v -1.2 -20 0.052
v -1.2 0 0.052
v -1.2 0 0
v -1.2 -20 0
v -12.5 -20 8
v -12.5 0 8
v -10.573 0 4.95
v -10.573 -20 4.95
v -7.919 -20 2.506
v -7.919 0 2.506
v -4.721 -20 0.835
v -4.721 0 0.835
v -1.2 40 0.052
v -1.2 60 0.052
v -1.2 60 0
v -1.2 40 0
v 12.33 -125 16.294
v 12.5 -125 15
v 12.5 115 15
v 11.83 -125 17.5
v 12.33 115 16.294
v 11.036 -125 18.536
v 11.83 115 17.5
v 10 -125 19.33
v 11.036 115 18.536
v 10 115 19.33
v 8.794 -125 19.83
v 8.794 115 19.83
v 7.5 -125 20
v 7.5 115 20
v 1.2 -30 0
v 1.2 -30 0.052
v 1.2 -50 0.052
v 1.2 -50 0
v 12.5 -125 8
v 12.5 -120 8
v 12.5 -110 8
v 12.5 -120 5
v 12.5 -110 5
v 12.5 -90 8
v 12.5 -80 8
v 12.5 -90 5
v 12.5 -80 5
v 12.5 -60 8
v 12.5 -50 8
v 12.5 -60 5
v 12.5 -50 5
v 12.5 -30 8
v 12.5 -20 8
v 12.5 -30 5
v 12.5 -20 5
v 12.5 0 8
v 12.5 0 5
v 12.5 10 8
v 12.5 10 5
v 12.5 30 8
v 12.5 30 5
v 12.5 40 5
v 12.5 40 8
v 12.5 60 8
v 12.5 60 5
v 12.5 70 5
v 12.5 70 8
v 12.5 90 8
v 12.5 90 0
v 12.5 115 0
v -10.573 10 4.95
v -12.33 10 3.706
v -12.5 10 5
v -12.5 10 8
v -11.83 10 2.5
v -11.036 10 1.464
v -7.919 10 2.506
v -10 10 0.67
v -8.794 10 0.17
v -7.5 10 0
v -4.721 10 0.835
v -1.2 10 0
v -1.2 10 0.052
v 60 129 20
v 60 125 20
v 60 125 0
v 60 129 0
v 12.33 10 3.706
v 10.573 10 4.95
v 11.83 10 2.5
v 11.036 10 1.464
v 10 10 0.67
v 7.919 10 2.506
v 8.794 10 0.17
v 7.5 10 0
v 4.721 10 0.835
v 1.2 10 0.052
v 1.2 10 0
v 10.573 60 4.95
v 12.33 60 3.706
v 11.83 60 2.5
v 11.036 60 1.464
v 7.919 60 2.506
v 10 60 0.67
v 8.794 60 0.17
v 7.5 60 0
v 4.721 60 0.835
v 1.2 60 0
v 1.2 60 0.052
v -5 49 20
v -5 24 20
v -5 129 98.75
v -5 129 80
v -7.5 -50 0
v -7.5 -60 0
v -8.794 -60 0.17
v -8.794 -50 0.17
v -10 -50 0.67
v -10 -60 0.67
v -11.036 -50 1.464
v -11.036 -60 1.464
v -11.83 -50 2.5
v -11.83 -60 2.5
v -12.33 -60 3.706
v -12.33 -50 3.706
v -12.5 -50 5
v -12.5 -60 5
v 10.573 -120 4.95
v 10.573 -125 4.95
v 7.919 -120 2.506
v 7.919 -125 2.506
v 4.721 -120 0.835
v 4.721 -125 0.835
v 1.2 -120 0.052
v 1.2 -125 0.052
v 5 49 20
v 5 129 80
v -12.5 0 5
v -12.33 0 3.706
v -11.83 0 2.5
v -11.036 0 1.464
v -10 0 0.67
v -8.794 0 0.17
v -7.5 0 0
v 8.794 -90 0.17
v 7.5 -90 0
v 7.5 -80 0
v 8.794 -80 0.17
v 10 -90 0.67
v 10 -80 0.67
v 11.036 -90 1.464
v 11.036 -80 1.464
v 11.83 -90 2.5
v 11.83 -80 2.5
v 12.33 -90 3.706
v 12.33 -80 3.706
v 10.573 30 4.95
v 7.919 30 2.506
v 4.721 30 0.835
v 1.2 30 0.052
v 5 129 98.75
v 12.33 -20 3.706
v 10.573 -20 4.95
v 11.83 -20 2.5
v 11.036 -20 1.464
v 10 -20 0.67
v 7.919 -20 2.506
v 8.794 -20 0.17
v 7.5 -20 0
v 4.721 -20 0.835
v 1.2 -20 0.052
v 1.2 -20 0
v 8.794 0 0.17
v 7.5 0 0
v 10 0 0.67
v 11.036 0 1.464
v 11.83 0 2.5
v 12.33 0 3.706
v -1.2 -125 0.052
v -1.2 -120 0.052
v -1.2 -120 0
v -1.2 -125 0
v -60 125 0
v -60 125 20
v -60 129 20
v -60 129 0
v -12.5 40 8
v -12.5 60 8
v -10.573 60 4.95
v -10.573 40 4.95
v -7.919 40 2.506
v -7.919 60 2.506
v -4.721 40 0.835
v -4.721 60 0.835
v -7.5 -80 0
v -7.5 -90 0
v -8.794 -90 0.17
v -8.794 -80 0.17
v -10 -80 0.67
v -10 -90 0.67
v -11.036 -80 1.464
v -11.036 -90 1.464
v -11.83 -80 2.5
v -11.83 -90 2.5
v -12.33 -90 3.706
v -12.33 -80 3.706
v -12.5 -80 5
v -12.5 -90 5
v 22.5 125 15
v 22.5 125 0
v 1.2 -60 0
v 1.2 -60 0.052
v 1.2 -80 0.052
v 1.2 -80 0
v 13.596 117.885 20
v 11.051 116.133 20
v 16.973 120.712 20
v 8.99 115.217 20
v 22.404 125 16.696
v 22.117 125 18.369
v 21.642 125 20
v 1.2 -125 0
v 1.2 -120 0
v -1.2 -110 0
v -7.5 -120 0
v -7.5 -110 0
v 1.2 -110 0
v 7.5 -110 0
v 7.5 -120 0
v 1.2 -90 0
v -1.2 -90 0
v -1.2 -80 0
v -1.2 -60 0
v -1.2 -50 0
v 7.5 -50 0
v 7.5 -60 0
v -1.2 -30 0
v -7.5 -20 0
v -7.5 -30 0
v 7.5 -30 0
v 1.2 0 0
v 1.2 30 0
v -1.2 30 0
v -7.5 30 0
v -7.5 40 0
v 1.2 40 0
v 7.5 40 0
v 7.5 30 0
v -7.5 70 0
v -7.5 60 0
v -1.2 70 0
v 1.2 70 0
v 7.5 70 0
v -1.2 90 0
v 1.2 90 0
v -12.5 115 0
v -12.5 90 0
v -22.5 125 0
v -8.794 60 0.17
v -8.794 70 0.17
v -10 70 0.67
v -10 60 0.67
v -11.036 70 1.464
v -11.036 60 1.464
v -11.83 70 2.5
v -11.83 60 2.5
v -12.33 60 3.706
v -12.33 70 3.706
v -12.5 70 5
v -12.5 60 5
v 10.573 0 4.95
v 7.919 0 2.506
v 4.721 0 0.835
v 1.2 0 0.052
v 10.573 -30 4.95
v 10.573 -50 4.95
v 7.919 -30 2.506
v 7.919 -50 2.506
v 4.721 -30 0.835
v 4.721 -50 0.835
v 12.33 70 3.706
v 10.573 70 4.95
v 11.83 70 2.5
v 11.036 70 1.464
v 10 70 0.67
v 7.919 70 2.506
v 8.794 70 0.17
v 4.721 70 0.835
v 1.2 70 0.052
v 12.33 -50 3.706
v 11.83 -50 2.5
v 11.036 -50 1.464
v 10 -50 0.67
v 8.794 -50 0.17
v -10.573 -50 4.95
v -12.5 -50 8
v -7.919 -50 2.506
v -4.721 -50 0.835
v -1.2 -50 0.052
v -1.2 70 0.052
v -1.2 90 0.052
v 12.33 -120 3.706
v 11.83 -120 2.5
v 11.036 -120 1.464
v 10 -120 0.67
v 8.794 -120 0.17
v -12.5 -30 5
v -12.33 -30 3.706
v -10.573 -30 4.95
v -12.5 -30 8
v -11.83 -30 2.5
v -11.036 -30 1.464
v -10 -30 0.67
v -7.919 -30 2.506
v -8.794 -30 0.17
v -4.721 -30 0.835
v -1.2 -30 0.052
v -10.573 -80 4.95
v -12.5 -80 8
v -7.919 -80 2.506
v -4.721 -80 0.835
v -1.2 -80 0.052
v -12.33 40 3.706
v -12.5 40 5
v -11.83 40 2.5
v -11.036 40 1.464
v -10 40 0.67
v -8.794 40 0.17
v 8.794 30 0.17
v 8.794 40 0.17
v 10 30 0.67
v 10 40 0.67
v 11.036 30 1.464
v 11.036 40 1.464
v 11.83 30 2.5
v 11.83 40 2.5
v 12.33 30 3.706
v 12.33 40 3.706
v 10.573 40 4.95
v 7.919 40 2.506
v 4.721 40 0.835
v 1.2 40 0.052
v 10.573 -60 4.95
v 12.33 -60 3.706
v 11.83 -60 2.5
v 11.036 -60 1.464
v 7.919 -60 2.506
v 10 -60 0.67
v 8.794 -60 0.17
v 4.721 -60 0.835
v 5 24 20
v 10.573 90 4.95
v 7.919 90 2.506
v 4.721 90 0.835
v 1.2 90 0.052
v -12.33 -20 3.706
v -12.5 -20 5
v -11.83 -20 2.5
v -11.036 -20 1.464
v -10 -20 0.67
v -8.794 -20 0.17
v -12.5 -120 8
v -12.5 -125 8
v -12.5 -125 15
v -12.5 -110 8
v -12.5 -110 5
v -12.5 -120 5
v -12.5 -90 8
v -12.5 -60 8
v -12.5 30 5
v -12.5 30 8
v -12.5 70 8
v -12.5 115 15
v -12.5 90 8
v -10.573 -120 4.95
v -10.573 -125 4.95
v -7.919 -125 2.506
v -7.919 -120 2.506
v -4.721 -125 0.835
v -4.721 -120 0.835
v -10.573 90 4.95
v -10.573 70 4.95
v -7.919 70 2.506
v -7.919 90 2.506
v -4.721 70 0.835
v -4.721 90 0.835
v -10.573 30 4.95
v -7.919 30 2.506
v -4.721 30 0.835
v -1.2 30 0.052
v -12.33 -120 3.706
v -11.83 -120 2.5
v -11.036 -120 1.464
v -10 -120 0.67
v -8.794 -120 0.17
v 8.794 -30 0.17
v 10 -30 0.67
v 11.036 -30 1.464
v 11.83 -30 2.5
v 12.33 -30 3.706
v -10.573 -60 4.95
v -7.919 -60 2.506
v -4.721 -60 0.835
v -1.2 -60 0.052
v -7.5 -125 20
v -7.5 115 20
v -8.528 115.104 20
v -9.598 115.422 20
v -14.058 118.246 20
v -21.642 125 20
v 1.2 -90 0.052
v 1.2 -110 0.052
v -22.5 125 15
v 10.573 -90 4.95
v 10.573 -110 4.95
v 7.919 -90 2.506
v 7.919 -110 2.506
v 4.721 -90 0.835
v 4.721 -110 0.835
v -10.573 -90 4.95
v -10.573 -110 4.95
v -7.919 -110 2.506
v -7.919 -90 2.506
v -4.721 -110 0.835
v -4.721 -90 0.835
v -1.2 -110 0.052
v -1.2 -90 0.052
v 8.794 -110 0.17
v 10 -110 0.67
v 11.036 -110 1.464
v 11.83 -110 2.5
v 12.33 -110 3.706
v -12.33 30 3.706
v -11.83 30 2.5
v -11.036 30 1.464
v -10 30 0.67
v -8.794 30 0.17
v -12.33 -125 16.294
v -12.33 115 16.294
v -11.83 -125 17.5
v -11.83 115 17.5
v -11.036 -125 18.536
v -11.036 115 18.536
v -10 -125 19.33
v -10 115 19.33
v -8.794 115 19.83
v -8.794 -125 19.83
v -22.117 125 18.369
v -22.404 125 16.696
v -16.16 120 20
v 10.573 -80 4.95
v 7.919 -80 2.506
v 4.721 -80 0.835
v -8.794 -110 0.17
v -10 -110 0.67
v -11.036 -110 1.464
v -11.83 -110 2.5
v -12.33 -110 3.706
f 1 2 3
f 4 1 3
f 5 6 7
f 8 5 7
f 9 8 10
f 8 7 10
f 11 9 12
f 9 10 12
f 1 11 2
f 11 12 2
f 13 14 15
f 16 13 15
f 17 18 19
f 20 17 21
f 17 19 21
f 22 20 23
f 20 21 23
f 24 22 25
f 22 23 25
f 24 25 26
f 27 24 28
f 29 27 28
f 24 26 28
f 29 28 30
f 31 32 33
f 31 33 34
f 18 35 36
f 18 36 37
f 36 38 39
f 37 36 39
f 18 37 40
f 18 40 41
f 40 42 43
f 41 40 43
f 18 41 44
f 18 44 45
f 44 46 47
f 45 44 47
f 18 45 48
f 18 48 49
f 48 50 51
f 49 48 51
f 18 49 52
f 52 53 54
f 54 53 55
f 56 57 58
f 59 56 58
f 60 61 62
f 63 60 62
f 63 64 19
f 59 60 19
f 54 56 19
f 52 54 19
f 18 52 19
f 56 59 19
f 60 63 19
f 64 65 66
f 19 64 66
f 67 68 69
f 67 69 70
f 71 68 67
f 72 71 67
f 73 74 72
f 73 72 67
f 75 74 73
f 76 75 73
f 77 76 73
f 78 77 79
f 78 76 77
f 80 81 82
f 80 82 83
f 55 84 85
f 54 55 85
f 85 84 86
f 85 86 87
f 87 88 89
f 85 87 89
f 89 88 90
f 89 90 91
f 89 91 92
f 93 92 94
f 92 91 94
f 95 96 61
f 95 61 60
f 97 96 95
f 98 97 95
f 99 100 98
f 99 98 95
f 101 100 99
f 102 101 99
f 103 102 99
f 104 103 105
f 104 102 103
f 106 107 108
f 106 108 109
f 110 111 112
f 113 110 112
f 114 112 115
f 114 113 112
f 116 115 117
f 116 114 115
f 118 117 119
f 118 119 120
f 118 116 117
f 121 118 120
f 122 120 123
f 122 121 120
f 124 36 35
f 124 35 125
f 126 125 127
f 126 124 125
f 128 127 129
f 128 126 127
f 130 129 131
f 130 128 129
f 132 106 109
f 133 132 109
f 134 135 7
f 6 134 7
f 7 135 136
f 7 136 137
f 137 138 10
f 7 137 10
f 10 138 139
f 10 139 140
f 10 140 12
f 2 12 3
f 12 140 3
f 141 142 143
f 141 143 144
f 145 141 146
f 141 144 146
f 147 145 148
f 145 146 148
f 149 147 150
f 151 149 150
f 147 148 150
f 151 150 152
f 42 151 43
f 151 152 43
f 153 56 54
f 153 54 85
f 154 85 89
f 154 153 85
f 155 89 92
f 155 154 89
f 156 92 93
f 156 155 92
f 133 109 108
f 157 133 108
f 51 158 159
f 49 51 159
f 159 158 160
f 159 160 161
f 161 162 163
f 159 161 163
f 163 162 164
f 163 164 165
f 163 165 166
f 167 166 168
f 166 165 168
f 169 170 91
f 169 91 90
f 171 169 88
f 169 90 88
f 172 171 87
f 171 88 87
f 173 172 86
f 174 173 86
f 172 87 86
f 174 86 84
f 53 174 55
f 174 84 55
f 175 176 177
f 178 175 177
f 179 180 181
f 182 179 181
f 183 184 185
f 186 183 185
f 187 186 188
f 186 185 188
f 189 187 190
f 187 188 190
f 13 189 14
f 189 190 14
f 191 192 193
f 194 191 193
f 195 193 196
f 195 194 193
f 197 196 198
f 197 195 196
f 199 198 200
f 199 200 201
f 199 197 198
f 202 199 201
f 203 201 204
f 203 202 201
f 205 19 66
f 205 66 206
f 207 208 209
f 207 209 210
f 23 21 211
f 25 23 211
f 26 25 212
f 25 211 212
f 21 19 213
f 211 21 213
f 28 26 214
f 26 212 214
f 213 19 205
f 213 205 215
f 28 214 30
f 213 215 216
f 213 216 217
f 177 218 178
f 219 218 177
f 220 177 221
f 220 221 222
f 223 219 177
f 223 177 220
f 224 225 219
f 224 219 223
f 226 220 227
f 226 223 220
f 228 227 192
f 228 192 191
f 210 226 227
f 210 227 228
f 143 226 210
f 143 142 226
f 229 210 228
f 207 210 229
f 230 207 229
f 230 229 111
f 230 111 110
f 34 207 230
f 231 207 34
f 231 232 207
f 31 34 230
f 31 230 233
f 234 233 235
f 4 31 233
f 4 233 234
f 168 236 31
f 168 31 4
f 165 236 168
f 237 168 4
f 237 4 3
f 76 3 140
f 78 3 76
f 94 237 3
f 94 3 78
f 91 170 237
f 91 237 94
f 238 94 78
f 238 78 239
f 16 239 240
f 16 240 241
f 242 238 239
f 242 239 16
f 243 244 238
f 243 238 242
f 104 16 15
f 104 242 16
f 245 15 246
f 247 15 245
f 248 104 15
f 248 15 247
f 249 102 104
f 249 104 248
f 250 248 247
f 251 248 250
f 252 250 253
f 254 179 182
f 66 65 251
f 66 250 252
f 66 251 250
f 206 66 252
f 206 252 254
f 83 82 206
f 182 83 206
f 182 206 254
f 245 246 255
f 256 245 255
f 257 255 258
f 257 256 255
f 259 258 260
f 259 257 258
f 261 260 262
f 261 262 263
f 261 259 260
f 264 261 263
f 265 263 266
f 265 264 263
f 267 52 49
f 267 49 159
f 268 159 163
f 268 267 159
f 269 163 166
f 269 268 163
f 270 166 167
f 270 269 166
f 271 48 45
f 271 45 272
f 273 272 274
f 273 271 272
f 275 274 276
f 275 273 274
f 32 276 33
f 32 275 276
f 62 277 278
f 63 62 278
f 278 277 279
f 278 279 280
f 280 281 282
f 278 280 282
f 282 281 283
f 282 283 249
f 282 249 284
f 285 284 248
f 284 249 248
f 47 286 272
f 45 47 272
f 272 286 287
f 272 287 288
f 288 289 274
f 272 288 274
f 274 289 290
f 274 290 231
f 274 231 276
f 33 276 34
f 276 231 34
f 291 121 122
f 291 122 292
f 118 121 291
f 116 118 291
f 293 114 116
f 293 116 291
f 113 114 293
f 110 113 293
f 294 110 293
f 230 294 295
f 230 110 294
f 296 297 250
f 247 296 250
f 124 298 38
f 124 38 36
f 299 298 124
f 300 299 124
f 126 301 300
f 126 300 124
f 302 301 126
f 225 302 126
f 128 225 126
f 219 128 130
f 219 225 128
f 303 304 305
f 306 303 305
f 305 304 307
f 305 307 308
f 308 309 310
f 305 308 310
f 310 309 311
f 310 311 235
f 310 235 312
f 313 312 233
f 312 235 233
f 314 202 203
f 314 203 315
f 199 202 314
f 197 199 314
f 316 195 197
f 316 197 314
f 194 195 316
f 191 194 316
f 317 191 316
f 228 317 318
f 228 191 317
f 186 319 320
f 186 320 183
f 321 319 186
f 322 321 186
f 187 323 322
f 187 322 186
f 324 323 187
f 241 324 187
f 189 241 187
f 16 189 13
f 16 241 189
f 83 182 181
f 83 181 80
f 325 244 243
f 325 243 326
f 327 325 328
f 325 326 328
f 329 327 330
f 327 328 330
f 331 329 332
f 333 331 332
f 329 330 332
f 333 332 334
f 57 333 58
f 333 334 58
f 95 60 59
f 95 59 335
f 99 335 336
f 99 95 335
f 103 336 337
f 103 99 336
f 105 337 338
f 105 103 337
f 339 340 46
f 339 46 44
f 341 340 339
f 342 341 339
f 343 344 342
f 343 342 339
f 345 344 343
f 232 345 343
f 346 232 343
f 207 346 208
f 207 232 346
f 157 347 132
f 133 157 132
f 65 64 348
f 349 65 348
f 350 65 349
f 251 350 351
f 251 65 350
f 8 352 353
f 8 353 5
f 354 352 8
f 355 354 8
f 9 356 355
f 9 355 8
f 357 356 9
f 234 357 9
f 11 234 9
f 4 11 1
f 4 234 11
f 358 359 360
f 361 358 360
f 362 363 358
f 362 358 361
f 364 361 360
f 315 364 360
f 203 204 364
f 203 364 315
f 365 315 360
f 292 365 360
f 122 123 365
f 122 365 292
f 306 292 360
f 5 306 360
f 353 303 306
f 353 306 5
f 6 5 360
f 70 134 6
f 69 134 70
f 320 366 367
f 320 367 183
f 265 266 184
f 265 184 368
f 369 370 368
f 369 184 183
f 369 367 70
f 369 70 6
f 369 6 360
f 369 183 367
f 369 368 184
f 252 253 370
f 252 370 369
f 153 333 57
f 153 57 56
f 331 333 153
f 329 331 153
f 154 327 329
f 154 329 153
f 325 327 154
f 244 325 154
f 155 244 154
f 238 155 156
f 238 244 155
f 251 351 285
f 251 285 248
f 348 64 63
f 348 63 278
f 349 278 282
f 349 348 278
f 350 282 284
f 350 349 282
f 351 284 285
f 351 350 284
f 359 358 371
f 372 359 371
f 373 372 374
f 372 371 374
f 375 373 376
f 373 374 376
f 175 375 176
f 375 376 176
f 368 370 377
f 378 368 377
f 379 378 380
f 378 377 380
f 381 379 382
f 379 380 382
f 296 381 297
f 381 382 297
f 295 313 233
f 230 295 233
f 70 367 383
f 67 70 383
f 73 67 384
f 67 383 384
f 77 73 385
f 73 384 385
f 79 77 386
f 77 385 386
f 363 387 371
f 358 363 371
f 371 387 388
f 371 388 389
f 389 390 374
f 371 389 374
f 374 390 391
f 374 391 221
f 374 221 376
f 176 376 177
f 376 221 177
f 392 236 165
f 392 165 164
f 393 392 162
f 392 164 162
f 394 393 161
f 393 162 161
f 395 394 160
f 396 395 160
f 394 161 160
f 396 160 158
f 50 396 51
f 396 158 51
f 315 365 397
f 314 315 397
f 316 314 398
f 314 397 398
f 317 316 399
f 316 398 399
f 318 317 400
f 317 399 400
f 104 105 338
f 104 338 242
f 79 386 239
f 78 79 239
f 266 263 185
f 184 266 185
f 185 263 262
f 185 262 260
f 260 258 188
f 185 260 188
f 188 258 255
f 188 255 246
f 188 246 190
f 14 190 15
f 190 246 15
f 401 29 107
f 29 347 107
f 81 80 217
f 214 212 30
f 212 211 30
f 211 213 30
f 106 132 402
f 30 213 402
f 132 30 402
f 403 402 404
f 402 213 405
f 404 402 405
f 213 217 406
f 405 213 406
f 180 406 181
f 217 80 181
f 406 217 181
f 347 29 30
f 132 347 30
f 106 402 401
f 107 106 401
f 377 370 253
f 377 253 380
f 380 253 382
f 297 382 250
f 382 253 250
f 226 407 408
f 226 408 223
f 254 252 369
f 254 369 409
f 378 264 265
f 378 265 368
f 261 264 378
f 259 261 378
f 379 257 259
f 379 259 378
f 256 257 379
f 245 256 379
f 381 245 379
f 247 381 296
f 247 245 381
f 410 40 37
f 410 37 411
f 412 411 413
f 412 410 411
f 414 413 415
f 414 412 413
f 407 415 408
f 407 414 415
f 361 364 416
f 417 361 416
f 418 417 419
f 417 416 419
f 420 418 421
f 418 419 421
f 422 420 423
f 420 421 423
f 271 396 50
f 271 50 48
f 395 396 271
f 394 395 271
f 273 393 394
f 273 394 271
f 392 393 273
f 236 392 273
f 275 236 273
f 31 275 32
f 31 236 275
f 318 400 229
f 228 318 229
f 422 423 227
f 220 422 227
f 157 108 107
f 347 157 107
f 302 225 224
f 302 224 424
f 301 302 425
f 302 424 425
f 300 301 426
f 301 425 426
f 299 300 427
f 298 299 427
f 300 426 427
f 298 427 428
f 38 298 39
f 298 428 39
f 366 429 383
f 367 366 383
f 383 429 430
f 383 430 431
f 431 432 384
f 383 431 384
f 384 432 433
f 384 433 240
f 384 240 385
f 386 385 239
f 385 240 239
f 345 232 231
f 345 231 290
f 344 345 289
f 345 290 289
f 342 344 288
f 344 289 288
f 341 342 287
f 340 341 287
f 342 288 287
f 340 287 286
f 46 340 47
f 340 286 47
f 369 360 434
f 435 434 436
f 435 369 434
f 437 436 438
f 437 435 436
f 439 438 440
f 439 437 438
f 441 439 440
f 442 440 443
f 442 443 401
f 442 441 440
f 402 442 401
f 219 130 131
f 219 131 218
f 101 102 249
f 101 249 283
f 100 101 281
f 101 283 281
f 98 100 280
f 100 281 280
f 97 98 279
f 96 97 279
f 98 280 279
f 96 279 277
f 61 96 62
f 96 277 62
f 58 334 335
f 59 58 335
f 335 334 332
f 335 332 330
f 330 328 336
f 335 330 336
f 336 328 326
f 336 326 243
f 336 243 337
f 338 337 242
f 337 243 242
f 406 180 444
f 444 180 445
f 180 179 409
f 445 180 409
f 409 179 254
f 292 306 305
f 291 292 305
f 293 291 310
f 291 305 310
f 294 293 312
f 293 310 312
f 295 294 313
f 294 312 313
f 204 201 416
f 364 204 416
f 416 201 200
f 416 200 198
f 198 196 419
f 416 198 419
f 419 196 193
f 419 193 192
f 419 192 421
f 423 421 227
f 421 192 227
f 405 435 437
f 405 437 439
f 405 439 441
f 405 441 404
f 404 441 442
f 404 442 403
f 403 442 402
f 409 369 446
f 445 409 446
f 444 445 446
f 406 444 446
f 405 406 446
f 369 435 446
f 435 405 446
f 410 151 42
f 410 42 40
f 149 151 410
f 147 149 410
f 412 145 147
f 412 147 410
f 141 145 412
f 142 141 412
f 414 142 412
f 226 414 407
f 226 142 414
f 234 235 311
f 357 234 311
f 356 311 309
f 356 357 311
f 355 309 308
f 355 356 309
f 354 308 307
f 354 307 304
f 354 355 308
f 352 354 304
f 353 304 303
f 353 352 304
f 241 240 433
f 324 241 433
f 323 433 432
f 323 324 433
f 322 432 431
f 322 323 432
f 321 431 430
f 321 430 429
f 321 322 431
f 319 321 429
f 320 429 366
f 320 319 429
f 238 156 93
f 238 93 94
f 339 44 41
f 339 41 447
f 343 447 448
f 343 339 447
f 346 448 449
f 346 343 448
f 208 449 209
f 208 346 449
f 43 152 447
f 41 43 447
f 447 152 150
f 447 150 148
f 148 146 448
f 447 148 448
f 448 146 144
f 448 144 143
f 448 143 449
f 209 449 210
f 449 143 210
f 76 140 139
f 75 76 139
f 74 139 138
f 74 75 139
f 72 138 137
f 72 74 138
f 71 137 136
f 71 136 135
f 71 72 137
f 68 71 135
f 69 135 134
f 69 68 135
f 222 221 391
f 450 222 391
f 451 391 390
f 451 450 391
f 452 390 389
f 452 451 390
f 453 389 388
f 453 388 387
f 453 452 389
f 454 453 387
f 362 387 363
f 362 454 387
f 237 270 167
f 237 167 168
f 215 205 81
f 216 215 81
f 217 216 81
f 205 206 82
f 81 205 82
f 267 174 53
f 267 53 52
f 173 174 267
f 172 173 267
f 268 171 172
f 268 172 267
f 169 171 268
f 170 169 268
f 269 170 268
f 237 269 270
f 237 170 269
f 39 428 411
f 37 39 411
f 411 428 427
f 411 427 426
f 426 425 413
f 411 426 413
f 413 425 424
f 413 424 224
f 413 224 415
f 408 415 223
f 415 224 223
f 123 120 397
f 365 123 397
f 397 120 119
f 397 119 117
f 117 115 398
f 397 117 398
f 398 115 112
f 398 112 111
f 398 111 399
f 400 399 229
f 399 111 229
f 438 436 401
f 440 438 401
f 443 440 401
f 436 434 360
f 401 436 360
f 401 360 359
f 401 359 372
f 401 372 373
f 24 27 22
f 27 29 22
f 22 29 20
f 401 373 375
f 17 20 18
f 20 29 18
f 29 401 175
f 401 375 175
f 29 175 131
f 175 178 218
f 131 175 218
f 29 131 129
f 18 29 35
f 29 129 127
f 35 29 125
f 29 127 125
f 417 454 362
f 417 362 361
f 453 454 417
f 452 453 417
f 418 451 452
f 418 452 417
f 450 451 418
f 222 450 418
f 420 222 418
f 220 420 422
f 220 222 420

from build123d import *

# Parameters (mm, degrees)
SKETCH1_W                = 25
SKETCH1_H                = 250
BOSS_EXTRUDE1_DEPTH      = 20
SKETCH2_W                = 120
SKETCH2_H                = 4
BOSS_EXTRUDE2_DEPTH      = 20
CUT_EXTRUDE1_DEPTH       = 20
LPATTERN1_COUNT          = 5
LPATTERN1_PITCH          = 30
LPATTERN1_COUNT_DIR2     = 4
LPATTERN1_PITCH_DIR2     = 30
FILLET1_R                = 5
BOSS_EXTRUDE4_DEPTH      = 5
BOSS_EXTRUDE4_DEPTH_BACK = 5
FILLET2_R                = 5
CHAMFER1_SIZE            = 10


with BuildPart() as part:
    # Sketch1 → Boss-Extrude1 (new body)
    with BuildSketch(Plane.XY):
        Rectangle(SKETCH1_W, SKETCH1_H)
    extrude(amount=BOSS_EXTRUDE1_DEPTH)

    # Sketch2 → Boss-Extrude2 (add)
    with BuildSketch(Plane.XY):
        with Locations((0, 127)):
            Rectangle(SKETCH2_W, SKETCH2_H)
    extrude(amount=BOSS_EXTRUDE2_DEPTH)

    # Sketch5 → Cut-Extrude1 (cut)
    with BuildSketch(Plane(origin=(0, 0, 0), x_dir=(1, 0, 0), z_dir=(0, 1, 0))):
        with BuildLine():
            Line((1.199542867, -0.052363953), (1.199542867, 0))
            Line((1.199542867, 0), (12.5, 0))
            Line((12.5, 0), (12.5, -8))
            ThreePointArc((12.5, -8), (7.91900236, -2.505881075), (1.199542867, -0.052363953))
        make_face()
        with BuildLine():
            Line((-1.199542867, -0.052363953), (-1.199542867, 0))
            Line((-1.199542867, 0), (-12.5, 0))
            Line((-12.5, 0), (-12.5, -8))
            ThreePointArc((-12.5, -8), (-7.91900236, -2.505881075), (-1.199542867, -0.052363953))
        make_face()
    cut_extrude1 = extrude(amount=-CUT_EXTRUDE1_DEPTH, mode=Mode.SUBTRACT)

    # LPattern1: Cut-Extrude1 5 × 4
    with Locations(*[Vector(0, -1, 0) * (i * LPATTERN1_PITCH) + Vector(0, 1, 0) * (j * LPATTERN1_PITCH_DIR2) for i in range(LPATTERN1_COUNT) for j in range(LPATTERN1_COUNT_DIR2) if (i, j) != (0, 0)]):
        add(cut_extrude1, mode=Mode.SUBTRACT)

    # Fillet1
    fillet1_edges = [part.edges().sort_by_distance(p)[0] for p in [
        (-12.5, 65, 0),
        (12.5, 65, 0),
        (12.5, 35, 0),
        (12.5, 5, 0),
        (12.5, -25, 0),
        (12.5, -55, 0),
        (12.5, -85, 0),
        (12.5, -115, 0),
        (-12.5, 35, 0),
        (-12.5, 5, 0),
        (-12.5, -25, 0),
        (-12.5, -55, 0),
        (-12.5, -85, 0),
        (-12.5, -115, 0),
    ]]
    fillet(fillet1_edges, radius=FILLET1_R)

    # Sketch6 → Boss-Extrude4 (add, two sides: drawn at the far end of the back side and taken through both)
    with BuildSketch(Plane(origin=(0, 0, 0), x_dir=(0, 0, -1), z_dir=(1, 0, 0)).offset(-BOSS_EXTRUDE4_DEPTH_BACK)):
        Polygon((-20, 49), (-80, 129), (-98.75, 129), (-20, 24), align=None)
    extrude(amount=BOSS_EXTRUDE4_DEPTH + BOSS_EXTRUDE4_DEPTH_BACK)

    # Fillet2
    fillet2_edges = [part.edges().sort_by_distance(p)[0] for p in [
        (12.5, 0, 20),
        (-12.5, 0, 20),
    ]]
    fillet(fillet2_edges, radius=FILLET2_R)

    # Chamfer1
    chamfer1_edges = [part.edges().sort_by_distance(p)[0] for p in [
        (-12.5, 125, 7.5),
        (-11.035533906, 125, 18.535533906),
    ]]
    chamfer(chamfer1_edges, length=CHAMFER1_SIZE)
    chamfer1_2_edges = [part.edges().sort_by_distance(p)[0] for p in [
        (12.5, 125, 7.5),
        (11.035533906, 125, 18.535533906),
    ]]
    chamfer(chamfer1_2_edges, length=CHAMFER1_SIZE)


solid = part.part
